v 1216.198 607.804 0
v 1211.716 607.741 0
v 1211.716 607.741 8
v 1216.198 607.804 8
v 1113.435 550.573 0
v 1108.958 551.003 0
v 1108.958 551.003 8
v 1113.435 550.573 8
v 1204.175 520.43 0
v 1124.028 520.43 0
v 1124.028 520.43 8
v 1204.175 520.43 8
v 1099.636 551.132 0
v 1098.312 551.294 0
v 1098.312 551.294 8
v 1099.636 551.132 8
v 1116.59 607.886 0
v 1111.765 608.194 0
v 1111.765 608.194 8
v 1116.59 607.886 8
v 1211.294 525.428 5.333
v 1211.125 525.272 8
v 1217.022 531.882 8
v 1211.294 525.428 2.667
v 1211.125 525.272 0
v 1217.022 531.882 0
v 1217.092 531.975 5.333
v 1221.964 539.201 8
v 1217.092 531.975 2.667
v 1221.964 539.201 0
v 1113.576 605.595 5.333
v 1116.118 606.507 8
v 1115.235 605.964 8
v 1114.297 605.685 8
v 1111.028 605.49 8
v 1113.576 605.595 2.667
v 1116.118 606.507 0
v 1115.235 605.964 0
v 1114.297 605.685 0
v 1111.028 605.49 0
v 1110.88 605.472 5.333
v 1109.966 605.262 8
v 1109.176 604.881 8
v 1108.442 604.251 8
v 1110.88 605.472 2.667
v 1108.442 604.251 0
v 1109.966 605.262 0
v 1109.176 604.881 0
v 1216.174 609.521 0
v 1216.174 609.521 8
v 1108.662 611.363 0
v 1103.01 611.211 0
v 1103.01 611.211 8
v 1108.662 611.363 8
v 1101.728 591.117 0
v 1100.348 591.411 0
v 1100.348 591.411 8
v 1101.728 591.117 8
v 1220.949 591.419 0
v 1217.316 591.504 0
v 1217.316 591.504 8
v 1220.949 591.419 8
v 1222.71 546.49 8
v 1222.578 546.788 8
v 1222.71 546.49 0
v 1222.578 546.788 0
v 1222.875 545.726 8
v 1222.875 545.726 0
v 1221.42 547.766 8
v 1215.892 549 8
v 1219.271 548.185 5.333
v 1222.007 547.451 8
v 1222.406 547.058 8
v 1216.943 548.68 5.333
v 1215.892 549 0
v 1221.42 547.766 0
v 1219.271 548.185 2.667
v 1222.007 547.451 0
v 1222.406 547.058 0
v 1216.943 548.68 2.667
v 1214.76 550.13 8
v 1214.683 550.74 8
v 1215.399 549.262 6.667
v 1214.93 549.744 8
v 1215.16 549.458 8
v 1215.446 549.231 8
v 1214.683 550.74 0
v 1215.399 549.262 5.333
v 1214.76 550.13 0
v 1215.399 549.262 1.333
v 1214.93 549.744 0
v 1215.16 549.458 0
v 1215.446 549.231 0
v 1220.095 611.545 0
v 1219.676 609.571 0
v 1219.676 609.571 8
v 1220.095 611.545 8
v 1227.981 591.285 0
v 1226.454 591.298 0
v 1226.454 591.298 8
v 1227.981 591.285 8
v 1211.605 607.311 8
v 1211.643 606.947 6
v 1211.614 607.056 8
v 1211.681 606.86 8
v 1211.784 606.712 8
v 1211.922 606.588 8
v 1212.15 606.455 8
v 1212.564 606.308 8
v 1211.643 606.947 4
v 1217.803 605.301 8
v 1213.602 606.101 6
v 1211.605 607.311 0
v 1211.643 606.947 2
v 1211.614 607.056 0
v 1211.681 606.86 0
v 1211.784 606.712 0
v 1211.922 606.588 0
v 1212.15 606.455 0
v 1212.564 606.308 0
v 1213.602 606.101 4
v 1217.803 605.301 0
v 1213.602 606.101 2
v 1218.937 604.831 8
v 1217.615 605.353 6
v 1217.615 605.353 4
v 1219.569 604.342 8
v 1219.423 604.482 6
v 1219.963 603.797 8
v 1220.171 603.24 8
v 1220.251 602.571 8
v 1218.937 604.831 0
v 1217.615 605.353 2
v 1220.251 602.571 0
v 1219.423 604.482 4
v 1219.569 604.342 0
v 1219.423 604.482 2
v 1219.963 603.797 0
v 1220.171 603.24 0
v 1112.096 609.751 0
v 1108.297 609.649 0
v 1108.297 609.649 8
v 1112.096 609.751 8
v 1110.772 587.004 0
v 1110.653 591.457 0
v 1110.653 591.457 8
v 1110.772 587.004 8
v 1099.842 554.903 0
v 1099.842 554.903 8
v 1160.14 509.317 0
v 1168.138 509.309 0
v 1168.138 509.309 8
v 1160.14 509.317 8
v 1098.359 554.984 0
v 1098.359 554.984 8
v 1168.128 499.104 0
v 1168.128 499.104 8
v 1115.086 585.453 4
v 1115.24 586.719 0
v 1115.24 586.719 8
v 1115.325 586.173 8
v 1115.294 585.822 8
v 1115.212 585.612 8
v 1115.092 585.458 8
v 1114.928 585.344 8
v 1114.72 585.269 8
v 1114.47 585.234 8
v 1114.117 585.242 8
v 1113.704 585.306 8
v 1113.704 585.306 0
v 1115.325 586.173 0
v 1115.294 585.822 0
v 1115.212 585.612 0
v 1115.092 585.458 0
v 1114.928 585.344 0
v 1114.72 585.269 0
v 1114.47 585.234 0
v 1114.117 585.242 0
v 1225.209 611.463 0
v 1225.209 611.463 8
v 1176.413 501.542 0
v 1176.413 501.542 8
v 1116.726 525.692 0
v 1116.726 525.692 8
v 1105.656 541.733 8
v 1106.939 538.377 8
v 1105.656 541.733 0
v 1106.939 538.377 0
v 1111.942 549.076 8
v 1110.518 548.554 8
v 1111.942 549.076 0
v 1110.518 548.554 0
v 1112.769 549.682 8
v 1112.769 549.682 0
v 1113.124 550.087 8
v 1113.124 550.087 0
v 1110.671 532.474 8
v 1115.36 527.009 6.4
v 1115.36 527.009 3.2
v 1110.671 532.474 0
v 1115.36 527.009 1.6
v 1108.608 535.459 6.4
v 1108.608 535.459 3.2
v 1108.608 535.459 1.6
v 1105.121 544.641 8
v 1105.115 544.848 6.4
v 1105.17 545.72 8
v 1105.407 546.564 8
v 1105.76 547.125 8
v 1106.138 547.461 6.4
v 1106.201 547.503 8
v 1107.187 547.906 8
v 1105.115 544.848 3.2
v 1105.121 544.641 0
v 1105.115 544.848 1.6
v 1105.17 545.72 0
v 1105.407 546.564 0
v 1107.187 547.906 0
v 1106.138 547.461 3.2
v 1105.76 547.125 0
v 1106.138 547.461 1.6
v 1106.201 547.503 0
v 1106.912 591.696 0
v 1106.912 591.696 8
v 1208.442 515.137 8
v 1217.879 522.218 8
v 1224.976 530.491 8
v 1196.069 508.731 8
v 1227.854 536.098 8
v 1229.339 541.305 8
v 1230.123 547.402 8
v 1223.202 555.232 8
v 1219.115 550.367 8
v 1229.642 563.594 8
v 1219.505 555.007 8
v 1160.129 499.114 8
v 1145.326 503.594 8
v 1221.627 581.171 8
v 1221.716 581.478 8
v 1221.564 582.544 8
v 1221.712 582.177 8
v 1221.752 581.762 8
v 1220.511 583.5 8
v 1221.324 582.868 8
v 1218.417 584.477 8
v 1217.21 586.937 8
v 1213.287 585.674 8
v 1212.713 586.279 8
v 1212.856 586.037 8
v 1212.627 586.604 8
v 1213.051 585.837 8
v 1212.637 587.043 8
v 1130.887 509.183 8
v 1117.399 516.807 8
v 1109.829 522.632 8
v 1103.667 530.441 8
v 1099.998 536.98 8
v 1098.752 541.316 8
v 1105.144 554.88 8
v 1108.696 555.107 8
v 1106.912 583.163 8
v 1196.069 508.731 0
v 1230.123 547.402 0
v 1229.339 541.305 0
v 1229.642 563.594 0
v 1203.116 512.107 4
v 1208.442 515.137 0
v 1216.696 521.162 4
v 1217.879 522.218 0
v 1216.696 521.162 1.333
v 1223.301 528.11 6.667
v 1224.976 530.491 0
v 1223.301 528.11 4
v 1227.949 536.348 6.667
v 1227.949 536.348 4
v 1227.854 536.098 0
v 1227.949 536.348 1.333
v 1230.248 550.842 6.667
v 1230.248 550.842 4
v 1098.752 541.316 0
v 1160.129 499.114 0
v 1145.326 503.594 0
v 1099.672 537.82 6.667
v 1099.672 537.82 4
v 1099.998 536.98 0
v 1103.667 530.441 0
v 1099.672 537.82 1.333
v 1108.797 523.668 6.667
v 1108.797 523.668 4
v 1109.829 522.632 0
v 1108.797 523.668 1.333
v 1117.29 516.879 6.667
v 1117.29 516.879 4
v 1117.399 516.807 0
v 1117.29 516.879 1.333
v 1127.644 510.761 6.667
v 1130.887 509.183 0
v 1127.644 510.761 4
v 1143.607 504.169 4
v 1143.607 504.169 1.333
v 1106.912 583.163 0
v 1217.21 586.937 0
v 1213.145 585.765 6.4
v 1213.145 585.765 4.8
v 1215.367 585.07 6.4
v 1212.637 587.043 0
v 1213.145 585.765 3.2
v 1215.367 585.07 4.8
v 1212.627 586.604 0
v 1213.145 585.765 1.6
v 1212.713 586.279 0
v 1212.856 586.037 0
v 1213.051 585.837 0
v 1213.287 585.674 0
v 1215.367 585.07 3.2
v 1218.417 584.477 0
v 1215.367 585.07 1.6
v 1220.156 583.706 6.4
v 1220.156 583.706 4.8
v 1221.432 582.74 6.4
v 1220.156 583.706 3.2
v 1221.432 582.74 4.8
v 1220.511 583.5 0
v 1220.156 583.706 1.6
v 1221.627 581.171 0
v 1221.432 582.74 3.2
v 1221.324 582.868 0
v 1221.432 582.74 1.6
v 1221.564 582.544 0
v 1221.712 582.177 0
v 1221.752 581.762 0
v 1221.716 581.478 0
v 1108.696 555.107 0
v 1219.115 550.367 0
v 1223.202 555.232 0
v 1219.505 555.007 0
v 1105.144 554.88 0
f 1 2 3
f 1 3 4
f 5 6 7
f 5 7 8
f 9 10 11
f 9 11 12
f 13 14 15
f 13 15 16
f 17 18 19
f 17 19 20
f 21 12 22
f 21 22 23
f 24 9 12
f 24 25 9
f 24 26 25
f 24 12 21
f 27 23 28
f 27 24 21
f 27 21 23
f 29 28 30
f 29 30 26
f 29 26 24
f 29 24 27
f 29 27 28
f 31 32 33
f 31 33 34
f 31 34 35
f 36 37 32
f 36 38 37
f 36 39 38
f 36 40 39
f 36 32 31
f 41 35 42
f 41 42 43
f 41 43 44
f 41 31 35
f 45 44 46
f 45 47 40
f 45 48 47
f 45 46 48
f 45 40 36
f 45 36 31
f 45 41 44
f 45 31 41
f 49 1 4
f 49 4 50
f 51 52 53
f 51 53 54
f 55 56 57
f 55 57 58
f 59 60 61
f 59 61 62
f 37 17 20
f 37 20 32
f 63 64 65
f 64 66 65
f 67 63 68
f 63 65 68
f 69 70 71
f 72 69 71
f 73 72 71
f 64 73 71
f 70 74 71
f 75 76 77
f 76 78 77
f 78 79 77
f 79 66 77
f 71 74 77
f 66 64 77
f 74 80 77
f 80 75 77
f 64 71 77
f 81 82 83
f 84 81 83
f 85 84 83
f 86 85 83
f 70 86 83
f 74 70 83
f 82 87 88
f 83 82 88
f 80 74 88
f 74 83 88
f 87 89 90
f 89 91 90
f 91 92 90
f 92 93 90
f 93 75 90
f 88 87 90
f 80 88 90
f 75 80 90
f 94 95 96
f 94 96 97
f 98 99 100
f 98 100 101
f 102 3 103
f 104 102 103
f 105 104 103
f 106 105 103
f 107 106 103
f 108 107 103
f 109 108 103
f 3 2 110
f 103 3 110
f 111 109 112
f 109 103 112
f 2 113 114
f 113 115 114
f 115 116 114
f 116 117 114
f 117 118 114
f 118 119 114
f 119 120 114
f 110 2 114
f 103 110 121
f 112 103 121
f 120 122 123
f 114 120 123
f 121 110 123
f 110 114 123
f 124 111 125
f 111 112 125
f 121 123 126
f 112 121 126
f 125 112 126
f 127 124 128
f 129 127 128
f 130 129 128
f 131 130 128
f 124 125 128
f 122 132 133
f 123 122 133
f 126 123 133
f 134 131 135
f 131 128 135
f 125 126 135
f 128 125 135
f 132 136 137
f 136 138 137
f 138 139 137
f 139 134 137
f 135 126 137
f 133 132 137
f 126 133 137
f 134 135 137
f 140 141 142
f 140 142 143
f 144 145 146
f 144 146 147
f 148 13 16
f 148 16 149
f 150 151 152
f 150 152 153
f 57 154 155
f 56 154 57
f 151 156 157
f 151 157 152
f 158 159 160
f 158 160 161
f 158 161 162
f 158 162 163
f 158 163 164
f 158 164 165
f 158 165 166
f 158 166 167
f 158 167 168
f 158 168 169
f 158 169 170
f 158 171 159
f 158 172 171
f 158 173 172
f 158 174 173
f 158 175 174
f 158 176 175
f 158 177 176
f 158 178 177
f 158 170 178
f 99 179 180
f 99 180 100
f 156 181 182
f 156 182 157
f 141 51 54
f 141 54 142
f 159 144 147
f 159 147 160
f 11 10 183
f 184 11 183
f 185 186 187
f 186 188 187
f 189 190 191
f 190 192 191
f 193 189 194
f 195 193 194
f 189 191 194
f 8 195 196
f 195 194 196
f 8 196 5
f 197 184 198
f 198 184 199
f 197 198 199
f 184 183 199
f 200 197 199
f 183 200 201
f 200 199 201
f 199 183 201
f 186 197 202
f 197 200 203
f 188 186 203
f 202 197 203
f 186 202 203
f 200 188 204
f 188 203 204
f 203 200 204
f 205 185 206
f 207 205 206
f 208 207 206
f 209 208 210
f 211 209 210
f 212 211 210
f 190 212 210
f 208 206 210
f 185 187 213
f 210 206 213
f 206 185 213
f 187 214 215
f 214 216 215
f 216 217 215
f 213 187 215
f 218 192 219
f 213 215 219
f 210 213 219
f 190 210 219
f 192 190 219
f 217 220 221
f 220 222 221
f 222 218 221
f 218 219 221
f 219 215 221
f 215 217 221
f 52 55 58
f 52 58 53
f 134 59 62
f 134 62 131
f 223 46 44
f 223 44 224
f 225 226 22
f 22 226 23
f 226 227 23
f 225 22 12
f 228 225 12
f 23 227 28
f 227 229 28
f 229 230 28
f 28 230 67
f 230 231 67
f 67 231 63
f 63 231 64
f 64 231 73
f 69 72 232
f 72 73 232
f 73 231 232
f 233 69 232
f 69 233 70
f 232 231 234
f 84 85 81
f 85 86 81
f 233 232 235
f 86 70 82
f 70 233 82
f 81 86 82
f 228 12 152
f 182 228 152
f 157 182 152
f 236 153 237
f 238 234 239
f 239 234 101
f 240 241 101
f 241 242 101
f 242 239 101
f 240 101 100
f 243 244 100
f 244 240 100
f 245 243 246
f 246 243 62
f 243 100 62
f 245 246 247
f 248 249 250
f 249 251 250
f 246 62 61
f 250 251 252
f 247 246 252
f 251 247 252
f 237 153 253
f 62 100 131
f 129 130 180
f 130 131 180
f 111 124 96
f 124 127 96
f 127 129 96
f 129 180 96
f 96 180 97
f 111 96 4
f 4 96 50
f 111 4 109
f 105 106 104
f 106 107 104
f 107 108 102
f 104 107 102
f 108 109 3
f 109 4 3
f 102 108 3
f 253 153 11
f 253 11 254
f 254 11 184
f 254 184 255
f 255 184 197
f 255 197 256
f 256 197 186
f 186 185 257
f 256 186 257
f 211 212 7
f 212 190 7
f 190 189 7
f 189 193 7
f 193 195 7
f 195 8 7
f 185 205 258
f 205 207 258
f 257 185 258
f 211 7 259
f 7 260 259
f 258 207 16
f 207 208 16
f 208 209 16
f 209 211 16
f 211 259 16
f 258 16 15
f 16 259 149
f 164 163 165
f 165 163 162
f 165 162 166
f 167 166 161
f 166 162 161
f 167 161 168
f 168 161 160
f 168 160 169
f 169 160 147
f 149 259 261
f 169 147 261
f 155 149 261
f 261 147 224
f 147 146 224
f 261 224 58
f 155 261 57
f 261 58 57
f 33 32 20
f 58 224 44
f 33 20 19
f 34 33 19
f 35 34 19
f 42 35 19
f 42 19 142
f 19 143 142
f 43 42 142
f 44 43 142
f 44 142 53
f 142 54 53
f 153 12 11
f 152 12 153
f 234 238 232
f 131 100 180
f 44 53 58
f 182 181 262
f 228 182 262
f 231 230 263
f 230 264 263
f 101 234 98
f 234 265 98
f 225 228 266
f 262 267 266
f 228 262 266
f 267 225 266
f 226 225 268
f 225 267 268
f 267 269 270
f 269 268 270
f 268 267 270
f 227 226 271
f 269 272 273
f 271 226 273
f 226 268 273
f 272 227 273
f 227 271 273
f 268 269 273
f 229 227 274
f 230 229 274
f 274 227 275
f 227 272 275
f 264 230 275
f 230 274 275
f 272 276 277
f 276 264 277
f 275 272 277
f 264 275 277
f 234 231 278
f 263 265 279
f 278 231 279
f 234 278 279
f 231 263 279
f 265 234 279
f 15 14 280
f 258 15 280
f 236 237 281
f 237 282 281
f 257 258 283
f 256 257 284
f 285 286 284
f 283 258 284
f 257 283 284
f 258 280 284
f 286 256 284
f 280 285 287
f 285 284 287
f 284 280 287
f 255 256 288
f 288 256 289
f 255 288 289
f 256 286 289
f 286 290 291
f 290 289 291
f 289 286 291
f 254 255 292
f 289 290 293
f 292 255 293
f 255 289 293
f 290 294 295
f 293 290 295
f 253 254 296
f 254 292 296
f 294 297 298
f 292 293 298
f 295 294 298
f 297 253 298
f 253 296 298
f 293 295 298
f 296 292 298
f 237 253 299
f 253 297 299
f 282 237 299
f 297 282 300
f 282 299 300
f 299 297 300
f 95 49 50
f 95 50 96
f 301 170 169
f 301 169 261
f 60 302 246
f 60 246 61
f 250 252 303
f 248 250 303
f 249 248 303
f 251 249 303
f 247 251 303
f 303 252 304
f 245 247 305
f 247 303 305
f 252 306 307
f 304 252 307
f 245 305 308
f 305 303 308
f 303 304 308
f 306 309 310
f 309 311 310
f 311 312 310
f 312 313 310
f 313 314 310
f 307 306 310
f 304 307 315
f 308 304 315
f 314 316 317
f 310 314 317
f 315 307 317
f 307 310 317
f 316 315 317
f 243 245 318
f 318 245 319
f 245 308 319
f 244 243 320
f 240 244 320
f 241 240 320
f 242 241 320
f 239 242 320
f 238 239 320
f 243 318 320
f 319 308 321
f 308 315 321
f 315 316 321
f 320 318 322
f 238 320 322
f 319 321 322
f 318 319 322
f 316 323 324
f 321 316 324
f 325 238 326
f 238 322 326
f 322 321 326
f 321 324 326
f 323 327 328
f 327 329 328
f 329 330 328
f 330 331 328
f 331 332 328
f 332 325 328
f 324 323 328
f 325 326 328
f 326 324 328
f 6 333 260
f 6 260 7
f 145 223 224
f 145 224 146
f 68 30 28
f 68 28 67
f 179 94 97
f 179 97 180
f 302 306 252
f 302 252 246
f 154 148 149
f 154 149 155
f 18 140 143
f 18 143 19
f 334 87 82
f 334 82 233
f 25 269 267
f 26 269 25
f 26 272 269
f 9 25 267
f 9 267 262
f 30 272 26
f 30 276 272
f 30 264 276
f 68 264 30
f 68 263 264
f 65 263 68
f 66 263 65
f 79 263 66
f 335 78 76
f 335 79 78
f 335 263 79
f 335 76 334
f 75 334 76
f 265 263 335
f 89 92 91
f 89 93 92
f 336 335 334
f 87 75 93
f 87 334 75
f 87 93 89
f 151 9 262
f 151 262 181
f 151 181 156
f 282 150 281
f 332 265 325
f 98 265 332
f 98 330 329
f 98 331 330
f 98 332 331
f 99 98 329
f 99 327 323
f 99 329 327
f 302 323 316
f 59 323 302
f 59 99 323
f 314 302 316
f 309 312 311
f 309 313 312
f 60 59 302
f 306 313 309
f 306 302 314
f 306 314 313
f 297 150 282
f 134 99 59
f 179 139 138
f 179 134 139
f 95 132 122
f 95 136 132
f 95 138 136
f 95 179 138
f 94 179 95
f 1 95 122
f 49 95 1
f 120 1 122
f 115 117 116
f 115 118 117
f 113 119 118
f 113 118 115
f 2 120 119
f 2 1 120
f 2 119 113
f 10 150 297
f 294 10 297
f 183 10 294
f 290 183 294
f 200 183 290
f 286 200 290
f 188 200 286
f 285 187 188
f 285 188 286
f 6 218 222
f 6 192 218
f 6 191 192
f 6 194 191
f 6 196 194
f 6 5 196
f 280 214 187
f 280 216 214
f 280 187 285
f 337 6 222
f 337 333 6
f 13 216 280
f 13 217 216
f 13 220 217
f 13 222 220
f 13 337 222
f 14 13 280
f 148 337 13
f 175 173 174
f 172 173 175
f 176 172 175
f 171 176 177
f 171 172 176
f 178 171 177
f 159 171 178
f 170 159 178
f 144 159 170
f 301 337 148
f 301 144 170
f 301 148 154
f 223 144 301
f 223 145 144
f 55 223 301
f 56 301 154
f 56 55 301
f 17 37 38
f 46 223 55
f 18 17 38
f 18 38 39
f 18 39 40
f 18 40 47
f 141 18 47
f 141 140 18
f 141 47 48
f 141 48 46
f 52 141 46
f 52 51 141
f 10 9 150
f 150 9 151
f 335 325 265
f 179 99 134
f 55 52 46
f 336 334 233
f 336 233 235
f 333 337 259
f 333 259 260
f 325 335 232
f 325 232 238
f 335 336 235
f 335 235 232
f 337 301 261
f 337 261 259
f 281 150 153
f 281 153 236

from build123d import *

# Parameters (mm, degrees)
EXTRUDE_1_DEPTH = 8


with BuildPart() as part:
    # 草图1 → 凸台-拉伸1 (new body)
    with BuildSketch(Plane.XY):
        with BuildLine():
            Line((1124.028471583, 520.430109722), (1204.174904035, 520.430070778))
            add(Edge.make_bspline(
                [(1204.174904035, 520.430070778), (1212.085738121, 524.363222827), (1217.423615756, 531.925431574), (1221.963933213, 539.201405051)],
                knots=[0, 0, 0, 0, 1, 1, 1, 1], degree=3))
            Line((1221.963933213, 539.201405051), (1222.874728164, 545.726294408))
            add(Edge.make_bspline(
                [(1214.682588776, 550.739620034), (1214.671338256, 549.270061767), (1216.703883787, 548.726941269), (1219.946084595, 547.952502949), (1222.652477024, 547.941581282), (1222.874728164, 545.726294408)],
                knots=[0, 0, 0, 0, 0.316887322, 0.54582777, 1, 1, 1, 1], degree=3))
            Line((1214.682588776, 550.739620034), (1219.115415172, 550.367137409))
            Line((1219.115415172, 550.367137409), (1219.505320224, 555.007303918))
            Line((1219.505320224, 555.007303918), (1223.202343642, 555.231820955))
            Line((1223.202343642, 555.231820955), (1221.627082304, 581.170957375))
            add(Edge.make_bspline(
                [(1212.636585977, 587.043374717), (1212.454677562, 585.796181195), (1213.890055348, 585.378825619), (1216.221373323, 584.879752933), (1218.255242025, 584.695475039), (1220.659922483, 583.469719419), (1222.1127384, 582.509625086), (1221.627082304, 581.170957375)],
                knots=[0, 0, 0, 0, 0.239209187, 0.312947279, 0.612237184, 0.732749875, 1, 1, 1, 1], degree=3))
            Line((1212.636585977, 587.043374717), (1217.210449531, 586.937165754))
            Line((1217.210449531, 586.937165754), (1217.316487411, 591.503661615))
            Line((1217.316487411, 591.503661615), (1220.948759853, 591.41931719))
            Line((1220.948759853, 591.41931719), (1220.250872886, 602.571160309))
            add(Edge.make_bspline(
                [(1211.716465331, 607.740861376), (1211.187854841, 606.401817151), (1213.004759262, 606.264901424), (1215.196317894, 605.726179758), (1217.952697521, 605.533186742), (1220.225941655, 604.310982986), (1220.250872886, 602.571160309)],
                knots=[0, 0, 0, 0, 0.266116432, 0.349469371, 0.634145719, 1, 1, 1, 1], degree=3))
            Line((1211.716465331, 607.740861376), (1216.197671159, 607.803768601))
            Line((1216.197671159, 607.803768601), (1216.173557796, 609.521487724))
            Line((1216.173557796, 609.521487724), (1219.67550319, 609.570648078))
            Line((1219.67550319, 609.570648078), (1220.095083915, 611.544620192))
            Line((1220.095083915, 611.544620192), (1225.209117986, 611.46272634))
            Line((1225.209117986, 611.46272634), (1226.454457575, 591.298355637))
            Line((1226.454457575, 591.298355637), (1227.981133702, 591.284940949))
            add(Edge.make_bspline(
                [(1176.413358607, 501.541603889), (1185.511965328, 504.430669174), (1199.8218076, 509.491630158), (1217.865884469, 520.93290627), (1227.246018242, 532.266979554), (1231.059303267, 548.101040116), (1229.136307234, 566.682588001), (1228.599899115, 582.721408894), (1227.981133702, 591.284940949)],
                knots=[0, 0, 0, 0, 0.241209395, 0.378188323, 0.536810948, 0.593324023, 0.784372166, 1, 1, 1, 1], degree=3))
            Line((1176.413358607, 501.541603889), (1168.127567544, 499.103770177))
            Line((1168.127567544, 499.103770177), (1168.138433182, 509.308763091))
            Line((1168.138433182, 509.308763091), (1160.139894251, 509.317279435))
            Line((1160.139894251, 509.317279435), (1160.12903005, 499.113636864))
            add(Edge.make_bspline(
                [(1098.311715911, 551.293740787), (1098.16271854, 546.876679985), (1098.130057814, 539.47225151), (1103.429856905, 530.668564811), (1108.654696706, 522.952772916), (1117.543965476, 516.51310893), (1133.947418206, 506.654111254), (1149.153303542, 502.297432674), (1160.12903005, 499.113636864)],
                knots=[0, 0, 0, 0, 0.154650045, 0.237651291, 0.346708414, 0.470354138, 0.607131876, 1, 1, 1, 1], degree=3))
            Line((1098.311715911, 551.293740787), (1099.635988728, 551.132362423))
            Line((1099.635988728, 551.132362423), (1099.841894023, 554.902636544))
            Line((1099.841894023, 554.902636544), (1098.358655386, 554.983640386))
            Line((1098.358655386, 554.983640386), (1100.348039848, 591.410701366))
            Line((1100.348039848, 591.410701366), (1101.728076895, 591.117365436))
            Line((1101.728076895, 591.117365436), (1103.010262599, 611.21116483))
            Line((1103.010262599, 611.21116483), (1108.661620257, 611.362923176))
            Line((1108.661620257, 611.362923176), (1108.297361895, 609.649222315))
            Line((1108.297361895, 609.649222315), (1112.095812339, 609.751223744))
            Line((1112.095812339, 609.751223744), (1111.764897573, 608.194392169))
            Line((1111.764897573, 608.194392169), (1116.590439522, 607.886474249))
            Line((1116.590439522, 607.886474249), (1116.117932629, 606.507199486))
            add(Edge.make_bspline(
                [(1116.117932629, 606.507199486), (1113.791096831, 604.571413999), (1110.612497209, 606.648870888), (1108.442315229, 604.251277774)],
                knots=[0, 0, 0, 0, 1, 1, 1, 1], degree=3))
            Line((1108.442315229, 604.251277774), (1106.91226392, 591.695658143))
            Line((1106.91226392, 591.695658143), (1110.652746305, 591.456977894))
            Line((1110.652746305, 591.456977894), (1110.772315662, 587.00431205))
            Line((1110.772315662, 587.00431205), (1115.239758205, 586.71924446))
            add(Edge.make_bspline(
                [(1115.239758205, 586.71924446), (1115.70122676, 584.894177675), (1113.703765277, 585.306322128)],
                knots=[0, 0, 0, 1, 1, 1], degree=2))
            Line((1113.703765277, 585.306322128), (1106.91182657, 583.163333421))
            Line((1106.91182657, 583.163333421), (1105.144282892, 554.880236524))
            Line((1105.144282892, 554.880236524), (1108.69591202, 555.10705587))
            Line((1108.69591202, 555.10705587), (1108.95798166, 551.003463381))
            Line((1108.95798166, 551.003463381), (1113.434502264, 550.572955239))
            add(Edge.make_bspline(
                [(1124.028471583, 520.430109722), (1117.738543153, 523.748339757), (1110.715887779, 531.421288497), (1105.5970408, 540.587975664), (1104.461450054, 547.162517108), (1109.338415048, 548.524619873), (1112.276628203, 548.43481463), (1113.434502264, 550.572955239)],
                knots=[0, 0, 0, 0, 0.510505694, 0.664272713, 0.808402457, 0.847338435, 1, 1, 1, 1], degree=3))
        make_face()
    extrude(amount=EXTRUDE_1_DEPTH)


solid = part.part
